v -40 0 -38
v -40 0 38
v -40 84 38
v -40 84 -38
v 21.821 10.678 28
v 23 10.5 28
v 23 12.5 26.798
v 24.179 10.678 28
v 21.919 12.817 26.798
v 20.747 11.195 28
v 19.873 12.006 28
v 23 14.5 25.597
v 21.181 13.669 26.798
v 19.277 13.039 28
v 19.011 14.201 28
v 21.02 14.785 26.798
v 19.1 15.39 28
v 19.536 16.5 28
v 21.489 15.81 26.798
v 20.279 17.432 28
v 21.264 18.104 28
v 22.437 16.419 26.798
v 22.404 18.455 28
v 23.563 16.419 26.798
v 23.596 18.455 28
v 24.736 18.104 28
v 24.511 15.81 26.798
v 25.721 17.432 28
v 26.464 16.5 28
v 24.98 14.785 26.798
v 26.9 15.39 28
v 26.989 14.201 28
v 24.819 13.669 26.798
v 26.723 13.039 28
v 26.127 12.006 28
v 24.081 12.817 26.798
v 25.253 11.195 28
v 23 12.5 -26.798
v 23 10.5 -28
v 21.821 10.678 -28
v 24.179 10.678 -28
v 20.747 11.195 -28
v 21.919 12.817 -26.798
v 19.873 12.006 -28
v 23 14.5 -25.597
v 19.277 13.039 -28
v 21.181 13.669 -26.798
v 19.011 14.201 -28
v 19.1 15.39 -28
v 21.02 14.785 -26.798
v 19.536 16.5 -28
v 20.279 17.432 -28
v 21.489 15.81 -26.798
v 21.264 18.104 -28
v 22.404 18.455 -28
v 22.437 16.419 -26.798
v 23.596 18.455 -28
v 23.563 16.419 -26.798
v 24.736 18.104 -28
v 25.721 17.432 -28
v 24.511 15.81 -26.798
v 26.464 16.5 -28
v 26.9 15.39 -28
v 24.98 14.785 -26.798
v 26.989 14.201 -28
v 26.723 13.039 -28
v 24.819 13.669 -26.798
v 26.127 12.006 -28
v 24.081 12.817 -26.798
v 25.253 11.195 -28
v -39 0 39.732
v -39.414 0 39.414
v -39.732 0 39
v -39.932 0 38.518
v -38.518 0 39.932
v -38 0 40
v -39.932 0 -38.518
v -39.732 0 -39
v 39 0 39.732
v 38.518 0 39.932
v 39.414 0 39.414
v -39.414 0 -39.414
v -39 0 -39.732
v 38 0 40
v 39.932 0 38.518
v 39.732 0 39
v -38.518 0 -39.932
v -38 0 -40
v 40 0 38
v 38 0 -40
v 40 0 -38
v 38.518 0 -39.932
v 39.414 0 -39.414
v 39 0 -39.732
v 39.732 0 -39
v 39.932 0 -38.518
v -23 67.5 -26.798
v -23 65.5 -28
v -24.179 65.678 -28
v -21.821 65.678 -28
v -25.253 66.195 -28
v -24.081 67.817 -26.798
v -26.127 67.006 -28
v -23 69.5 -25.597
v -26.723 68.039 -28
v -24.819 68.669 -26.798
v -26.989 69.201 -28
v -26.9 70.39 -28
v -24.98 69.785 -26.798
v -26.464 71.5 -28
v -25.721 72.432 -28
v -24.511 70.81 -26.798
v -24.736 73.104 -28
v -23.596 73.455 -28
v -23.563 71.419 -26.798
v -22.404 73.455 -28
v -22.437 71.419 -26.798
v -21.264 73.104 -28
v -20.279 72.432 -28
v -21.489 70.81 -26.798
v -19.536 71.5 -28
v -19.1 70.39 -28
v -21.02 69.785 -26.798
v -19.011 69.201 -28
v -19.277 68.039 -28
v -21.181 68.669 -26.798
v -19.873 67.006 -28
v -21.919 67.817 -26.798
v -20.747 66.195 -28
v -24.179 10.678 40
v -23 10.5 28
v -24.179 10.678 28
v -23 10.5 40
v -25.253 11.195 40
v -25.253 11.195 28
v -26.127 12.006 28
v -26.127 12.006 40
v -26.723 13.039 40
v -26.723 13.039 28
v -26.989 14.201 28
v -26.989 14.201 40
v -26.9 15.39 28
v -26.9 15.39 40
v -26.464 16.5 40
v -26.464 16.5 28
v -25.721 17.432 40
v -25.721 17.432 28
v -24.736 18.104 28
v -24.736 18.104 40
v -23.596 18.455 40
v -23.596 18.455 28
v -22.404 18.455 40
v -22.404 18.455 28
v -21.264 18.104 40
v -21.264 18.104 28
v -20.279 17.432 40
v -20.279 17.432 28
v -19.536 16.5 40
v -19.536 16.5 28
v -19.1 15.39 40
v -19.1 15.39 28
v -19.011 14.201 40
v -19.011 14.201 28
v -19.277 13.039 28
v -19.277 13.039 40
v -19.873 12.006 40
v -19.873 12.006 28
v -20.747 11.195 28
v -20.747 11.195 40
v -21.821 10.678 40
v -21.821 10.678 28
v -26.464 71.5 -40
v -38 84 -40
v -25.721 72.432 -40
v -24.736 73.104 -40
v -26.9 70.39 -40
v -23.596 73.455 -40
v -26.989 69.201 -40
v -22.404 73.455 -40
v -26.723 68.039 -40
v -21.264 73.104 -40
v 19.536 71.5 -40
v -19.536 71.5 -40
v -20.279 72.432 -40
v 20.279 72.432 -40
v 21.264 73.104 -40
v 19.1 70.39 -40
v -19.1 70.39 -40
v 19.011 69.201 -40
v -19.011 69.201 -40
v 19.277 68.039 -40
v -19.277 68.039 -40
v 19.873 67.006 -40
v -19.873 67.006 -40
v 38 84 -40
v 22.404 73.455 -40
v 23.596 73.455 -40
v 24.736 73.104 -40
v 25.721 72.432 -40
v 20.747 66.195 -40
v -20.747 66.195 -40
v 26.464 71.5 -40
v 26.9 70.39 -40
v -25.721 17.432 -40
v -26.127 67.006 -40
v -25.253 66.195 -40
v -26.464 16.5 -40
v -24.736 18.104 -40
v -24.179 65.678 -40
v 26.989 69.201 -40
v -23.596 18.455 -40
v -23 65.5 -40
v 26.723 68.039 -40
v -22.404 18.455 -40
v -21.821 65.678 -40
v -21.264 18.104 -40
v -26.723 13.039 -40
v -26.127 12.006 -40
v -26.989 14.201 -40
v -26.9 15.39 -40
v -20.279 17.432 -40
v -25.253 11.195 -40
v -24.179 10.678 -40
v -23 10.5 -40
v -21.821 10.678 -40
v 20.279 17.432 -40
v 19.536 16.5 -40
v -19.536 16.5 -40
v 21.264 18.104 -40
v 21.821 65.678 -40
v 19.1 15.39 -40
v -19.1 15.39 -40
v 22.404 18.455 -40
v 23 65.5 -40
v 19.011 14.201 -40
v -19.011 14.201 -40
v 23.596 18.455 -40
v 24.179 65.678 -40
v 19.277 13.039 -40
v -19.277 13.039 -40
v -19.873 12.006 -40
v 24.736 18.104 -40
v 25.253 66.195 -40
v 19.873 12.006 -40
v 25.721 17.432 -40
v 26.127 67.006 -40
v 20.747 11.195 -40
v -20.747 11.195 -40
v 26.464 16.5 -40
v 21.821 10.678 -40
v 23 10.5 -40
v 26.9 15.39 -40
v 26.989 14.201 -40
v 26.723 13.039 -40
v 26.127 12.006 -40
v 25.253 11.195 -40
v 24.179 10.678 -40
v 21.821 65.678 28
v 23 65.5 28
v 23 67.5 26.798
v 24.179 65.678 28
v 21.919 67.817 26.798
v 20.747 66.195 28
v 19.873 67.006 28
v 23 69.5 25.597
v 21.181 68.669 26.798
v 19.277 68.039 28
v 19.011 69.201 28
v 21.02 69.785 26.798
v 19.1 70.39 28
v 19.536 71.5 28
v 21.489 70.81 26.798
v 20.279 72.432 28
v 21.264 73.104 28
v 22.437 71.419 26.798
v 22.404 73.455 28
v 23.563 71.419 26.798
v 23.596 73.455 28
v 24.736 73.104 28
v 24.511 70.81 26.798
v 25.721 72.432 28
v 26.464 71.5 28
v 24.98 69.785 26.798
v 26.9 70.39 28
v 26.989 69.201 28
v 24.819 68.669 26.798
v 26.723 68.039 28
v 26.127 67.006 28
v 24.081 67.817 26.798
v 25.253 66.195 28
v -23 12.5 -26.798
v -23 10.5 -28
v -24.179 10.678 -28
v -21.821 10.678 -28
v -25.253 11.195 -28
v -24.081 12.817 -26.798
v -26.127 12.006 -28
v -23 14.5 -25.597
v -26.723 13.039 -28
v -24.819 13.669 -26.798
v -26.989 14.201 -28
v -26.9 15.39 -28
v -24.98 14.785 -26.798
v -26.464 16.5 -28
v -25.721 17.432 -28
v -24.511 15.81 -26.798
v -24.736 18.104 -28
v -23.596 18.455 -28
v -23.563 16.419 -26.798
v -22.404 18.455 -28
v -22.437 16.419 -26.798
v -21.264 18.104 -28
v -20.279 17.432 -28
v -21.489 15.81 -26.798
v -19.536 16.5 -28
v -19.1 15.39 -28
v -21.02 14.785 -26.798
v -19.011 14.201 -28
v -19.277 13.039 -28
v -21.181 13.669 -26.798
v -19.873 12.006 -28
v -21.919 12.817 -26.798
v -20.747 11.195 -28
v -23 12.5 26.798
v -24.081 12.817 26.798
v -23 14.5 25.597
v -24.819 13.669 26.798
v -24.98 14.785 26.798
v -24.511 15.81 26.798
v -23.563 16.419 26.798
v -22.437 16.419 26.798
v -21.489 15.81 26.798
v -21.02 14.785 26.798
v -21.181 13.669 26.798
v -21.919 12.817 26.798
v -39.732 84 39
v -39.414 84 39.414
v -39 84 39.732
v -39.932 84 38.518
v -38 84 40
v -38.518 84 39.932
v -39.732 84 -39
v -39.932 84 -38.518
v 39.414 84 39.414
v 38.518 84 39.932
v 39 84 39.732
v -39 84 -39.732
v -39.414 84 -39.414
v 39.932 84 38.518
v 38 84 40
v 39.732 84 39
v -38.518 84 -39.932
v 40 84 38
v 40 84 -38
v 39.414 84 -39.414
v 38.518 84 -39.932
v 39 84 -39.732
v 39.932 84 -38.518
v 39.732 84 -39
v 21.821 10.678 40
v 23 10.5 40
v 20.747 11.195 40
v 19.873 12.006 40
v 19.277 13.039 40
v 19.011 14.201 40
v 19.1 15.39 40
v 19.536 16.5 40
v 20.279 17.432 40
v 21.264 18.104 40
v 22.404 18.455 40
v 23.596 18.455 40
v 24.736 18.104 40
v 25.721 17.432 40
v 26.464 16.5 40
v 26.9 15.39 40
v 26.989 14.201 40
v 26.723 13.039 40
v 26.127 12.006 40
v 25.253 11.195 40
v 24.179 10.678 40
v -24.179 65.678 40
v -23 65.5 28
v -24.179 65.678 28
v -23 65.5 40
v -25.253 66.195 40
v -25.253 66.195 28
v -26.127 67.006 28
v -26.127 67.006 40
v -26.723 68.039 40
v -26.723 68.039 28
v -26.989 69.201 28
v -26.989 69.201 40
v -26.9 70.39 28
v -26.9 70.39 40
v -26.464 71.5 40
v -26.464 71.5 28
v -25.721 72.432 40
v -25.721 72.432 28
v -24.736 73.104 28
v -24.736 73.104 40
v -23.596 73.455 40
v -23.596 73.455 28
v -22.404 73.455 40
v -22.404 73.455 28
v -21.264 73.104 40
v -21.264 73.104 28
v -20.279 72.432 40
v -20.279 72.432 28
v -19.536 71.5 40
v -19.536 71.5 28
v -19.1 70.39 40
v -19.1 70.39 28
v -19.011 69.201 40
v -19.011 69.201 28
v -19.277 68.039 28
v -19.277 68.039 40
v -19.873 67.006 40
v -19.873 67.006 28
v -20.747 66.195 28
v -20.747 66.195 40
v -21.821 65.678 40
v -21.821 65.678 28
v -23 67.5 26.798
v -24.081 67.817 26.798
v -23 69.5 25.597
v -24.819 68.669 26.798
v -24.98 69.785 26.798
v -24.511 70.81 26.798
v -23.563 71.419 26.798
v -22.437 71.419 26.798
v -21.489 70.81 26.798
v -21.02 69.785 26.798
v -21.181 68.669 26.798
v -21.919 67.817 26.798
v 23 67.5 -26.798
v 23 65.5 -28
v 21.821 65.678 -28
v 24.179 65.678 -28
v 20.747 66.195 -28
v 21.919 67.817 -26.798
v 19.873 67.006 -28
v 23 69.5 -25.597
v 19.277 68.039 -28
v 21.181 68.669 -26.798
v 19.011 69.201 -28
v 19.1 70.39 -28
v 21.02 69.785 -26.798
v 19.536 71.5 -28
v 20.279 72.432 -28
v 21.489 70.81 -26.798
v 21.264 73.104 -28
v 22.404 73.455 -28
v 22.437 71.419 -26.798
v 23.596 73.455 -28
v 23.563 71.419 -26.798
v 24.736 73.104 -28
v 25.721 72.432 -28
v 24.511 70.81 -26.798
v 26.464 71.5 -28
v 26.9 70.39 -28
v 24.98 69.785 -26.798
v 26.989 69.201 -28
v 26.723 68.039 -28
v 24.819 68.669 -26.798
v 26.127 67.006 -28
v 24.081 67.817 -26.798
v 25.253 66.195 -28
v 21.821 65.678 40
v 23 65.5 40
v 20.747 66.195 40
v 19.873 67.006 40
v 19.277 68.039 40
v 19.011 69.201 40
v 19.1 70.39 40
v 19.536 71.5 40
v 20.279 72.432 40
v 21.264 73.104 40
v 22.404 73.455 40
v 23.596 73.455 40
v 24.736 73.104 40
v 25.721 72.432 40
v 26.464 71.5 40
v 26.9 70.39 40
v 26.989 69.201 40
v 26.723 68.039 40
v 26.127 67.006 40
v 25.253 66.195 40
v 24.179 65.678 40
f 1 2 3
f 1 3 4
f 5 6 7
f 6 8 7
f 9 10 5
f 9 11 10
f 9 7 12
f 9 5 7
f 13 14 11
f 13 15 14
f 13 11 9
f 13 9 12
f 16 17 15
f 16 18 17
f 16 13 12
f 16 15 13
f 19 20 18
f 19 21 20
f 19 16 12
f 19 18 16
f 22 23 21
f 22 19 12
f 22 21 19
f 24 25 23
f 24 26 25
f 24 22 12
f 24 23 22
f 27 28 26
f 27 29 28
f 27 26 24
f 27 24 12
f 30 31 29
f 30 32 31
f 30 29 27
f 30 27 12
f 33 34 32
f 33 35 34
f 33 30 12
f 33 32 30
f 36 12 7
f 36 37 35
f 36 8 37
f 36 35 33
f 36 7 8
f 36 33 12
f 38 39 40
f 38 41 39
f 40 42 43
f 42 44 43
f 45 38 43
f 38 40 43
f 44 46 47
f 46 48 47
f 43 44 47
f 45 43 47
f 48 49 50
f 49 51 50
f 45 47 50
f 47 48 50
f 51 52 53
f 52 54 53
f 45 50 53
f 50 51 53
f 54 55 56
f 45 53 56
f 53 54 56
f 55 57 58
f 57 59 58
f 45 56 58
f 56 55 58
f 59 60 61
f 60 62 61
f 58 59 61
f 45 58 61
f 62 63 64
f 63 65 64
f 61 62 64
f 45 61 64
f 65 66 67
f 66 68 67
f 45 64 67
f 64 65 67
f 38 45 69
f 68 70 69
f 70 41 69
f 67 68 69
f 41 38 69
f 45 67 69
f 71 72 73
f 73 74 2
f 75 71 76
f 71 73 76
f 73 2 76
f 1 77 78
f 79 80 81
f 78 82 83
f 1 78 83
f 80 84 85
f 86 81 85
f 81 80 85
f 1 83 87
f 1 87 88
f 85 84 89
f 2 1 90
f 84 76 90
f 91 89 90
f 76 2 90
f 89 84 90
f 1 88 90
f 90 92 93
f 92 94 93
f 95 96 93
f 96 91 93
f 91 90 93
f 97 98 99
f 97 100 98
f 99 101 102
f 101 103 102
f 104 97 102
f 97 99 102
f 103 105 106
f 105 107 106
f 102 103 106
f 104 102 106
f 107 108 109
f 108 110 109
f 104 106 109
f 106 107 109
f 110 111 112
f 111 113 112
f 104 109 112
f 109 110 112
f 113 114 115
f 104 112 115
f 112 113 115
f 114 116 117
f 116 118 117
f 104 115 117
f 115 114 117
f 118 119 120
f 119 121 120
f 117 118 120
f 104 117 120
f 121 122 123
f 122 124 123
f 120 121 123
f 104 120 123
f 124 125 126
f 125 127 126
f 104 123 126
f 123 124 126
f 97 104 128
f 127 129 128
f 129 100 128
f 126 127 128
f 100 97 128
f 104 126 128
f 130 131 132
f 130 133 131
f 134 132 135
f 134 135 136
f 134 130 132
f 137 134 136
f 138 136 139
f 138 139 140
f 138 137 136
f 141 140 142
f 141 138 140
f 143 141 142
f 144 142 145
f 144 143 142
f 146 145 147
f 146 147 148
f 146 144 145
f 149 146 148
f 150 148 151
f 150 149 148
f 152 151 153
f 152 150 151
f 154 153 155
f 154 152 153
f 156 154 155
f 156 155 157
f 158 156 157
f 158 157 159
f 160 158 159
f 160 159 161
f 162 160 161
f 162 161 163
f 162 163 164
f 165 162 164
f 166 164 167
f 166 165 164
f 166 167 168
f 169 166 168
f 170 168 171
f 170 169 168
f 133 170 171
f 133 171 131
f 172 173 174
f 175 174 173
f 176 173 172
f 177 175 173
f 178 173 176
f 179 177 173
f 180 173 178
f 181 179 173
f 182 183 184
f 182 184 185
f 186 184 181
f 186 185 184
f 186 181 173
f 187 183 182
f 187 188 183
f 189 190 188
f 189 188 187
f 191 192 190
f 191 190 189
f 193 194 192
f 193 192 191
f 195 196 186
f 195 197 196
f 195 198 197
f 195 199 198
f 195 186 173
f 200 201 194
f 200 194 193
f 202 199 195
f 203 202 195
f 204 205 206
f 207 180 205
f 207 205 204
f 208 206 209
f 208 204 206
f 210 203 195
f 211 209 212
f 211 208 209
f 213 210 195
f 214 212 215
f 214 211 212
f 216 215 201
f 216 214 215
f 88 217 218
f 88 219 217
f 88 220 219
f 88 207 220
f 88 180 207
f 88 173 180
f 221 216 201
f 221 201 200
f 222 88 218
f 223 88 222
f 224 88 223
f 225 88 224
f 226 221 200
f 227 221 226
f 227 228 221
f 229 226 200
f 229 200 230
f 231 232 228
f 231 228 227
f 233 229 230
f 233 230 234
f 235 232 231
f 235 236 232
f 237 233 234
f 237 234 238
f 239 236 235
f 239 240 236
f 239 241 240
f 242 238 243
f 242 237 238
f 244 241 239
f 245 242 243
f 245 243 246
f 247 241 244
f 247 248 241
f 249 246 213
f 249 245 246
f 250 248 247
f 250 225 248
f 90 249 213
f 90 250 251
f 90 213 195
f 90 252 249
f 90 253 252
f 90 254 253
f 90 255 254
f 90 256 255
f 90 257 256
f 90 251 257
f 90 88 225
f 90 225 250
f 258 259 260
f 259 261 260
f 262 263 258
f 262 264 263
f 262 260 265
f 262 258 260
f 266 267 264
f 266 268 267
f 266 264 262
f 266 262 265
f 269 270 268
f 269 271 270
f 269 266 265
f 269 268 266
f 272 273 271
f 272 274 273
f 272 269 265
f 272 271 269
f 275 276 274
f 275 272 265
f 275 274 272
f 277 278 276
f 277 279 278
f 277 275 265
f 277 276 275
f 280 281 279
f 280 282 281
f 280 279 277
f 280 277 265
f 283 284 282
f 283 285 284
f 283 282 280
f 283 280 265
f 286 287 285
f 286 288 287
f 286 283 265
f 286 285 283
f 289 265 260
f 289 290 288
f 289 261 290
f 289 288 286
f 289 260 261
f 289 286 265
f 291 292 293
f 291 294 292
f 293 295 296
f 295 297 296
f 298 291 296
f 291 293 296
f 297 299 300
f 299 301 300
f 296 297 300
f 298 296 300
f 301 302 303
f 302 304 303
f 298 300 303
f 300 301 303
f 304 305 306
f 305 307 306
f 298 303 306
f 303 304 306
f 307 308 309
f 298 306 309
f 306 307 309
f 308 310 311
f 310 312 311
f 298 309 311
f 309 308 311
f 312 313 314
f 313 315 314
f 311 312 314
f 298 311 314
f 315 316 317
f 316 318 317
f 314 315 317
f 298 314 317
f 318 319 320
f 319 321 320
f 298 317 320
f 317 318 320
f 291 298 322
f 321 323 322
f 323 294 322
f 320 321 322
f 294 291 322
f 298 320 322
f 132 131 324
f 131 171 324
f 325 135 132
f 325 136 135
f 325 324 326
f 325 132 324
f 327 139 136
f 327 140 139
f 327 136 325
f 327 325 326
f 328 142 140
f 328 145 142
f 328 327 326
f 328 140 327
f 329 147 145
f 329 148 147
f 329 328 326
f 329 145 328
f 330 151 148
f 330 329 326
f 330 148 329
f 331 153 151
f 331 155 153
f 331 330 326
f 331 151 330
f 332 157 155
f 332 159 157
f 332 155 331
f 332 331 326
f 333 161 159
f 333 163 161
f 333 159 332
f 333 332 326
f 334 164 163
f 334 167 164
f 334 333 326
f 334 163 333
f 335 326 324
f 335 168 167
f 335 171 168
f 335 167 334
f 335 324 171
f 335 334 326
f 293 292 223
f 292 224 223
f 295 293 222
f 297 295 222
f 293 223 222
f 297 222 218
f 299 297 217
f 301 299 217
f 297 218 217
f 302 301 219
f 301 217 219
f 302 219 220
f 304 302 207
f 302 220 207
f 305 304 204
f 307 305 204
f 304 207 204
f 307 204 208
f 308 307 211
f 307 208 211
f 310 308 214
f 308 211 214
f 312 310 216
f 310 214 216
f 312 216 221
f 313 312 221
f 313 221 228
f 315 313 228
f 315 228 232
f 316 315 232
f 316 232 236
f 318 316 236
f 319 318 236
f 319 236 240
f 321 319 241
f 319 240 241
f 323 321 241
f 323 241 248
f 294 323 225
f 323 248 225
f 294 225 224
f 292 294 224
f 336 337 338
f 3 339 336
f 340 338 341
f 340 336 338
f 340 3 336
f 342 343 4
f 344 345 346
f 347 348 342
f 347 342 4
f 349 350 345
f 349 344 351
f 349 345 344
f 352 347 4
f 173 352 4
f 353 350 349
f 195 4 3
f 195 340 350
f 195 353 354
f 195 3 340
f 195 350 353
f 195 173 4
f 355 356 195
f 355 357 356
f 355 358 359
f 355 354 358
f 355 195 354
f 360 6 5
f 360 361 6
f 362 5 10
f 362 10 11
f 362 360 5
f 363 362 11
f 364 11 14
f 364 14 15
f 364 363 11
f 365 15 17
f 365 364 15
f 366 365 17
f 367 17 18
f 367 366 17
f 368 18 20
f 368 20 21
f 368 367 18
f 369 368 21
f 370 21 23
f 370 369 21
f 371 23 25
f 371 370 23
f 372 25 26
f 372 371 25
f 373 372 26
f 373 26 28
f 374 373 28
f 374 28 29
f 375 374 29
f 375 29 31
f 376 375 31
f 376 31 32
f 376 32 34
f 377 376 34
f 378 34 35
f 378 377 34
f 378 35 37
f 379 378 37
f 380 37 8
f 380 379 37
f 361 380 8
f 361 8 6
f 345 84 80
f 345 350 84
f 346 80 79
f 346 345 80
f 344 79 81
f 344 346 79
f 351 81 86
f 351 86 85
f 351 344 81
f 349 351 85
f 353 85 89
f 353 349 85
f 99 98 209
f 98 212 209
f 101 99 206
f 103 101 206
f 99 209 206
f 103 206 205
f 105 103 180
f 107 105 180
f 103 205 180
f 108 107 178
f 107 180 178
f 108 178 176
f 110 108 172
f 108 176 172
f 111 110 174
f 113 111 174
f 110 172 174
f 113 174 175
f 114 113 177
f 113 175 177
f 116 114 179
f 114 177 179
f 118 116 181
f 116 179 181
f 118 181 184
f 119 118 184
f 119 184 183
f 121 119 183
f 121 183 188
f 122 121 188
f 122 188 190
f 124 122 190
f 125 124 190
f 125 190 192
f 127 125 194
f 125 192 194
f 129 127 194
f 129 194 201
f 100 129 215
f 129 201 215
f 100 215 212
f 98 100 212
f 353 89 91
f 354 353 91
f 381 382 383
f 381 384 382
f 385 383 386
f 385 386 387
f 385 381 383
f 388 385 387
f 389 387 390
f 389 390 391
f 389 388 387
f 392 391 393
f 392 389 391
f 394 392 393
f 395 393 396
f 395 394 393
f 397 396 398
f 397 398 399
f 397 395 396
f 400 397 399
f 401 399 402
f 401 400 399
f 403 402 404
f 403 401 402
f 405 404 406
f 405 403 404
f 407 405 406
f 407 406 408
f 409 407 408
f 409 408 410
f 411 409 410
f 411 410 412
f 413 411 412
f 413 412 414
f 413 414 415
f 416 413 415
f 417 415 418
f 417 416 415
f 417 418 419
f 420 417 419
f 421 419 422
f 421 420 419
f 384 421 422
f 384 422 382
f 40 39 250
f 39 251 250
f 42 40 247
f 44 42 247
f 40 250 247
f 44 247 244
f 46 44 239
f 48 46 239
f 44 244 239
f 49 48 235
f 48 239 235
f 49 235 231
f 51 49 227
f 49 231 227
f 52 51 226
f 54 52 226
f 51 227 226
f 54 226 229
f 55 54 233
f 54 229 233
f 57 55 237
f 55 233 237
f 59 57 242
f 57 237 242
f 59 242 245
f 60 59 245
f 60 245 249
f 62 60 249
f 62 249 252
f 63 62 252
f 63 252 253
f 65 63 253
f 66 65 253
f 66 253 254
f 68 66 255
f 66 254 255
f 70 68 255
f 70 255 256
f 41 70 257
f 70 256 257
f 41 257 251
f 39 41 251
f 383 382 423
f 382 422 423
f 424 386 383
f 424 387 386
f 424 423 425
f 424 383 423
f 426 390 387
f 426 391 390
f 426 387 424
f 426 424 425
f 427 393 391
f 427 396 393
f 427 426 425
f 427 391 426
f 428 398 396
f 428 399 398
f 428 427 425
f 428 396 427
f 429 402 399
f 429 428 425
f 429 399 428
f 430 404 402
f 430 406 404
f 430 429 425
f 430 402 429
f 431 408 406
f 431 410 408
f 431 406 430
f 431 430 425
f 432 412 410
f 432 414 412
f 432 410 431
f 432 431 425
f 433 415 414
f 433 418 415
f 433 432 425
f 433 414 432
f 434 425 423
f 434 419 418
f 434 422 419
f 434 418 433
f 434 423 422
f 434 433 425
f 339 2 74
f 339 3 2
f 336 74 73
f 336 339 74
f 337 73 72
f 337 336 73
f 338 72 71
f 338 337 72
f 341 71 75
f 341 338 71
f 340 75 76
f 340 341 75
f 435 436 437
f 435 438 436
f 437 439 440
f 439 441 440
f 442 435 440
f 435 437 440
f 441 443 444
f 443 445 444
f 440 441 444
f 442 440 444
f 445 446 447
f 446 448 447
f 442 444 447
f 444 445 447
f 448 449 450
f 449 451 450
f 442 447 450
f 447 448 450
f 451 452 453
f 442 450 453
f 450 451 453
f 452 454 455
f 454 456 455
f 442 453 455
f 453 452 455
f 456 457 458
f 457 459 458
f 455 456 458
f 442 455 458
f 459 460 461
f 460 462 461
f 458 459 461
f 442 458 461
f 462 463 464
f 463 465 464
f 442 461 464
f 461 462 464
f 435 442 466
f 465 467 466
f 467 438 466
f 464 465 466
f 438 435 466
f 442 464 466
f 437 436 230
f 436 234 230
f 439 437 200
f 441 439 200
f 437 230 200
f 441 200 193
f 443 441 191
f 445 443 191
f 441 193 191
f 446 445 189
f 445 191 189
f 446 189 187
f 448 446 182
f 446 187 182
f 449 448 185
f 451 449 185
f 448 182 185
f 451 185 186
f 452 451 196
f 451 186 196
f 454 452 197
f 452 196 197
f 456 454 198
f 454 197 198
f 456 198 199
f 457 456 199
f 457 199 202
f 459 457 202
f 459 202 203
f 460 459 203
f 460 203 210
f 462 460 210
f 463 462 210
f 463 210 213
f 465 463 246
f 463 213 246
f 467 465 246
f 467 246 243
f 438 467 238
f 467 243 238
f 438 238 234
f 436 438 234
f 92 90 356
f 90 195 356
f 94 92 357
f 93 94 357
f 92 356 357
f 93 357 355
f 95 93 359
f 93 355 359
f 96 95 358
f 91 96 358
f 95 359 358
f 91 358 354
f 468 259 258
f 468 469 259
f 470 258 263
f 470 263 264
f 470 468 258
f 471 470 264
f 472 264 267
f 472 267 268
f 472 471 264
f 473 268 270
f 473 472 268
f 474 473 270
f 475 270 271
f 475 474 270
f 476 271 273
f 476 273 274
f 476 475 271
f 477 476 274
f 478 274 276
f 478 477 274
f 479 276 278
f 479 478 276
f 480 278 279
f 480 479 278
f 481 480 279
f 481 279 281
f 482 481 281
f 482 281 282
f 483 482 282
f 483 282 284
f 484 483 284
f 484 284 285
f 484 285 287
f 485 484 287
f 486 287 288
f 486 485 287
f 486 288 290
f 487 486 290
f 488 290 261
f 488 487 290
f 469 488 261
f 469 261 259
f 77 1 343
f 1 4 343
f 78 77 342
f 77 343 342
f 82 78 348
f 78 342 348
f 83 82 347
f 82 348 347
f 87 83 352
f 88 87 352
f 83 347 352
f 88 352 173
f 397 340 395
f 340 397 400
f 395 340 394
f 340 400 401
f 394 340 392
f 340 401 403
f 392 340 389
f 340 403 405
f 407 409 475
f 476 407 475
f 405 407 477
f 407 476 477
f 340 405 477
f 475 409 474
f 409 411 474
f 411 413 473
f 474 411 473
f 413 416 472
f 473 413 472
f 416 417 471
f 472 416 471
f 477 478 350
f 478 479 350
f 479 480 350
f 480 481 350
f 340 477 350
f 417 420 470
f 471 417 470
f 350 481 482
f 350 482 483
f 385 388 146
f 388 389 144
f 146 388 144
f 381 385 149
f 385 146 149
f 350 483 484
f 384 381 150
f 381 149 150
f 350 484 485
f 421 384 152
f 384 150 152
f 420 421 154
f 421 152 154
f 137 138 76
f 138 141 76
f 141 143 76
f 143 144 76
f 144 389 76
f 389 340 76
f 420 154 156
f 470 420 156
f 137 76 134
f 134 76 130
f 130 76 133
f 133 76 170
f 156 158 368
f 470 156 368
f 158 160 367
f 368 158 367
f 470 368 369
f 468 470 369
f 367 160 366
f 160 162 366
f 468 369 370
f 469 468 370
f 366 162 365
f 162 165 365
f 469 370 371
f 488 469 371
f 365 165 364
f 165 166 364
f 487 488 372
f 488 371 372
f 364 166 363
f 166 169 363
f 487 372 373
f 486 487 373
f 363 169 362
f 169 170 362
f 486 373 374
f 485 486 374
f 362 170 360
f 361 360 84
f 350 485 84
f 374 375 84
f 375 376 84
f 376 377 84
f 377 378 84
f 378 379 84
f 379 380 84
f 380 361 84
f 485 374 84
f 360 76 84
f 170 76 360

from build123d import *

# Parameters (mm, degrees)
SZKIC1_W                            = 80
SZKIC1_H                            = 80
DODANIE_WYCI_GNI_CIE1_DEPTH         = 84
OTWORY_USTALAJ_CE_8_0MM1_AT_2_COUNT = 2
OTWORY_USTALAJ_CE_8_0MM1_AT_2_PITCH = 46
OTWORY_USTALAJ_CE_8_0MM1_AT_3_COUNT = 2
OTWORY_USTALAJ_CE_8_0MM1_AT_3_PITCH = 71.700767081
OTWORY_USTALAJ_CE_8_0MM1_AT_4_COUNT = 2
OTWORY_USTALAJ_CE_8_0MM1_AT_4_PITCH = 55
ZAOKR_GLENIE2_R                     = 2


with BuildPart() as part:
    # Szkic1 → Dodanie-wyciągnięcie1 (new body)
    with BuildSketch(Plane(origin=(0, 0, 0), x_dir=(1, 0, 0), z_dir=(0, 1, 0))):
        Rectangle(SZKIC1_W, SZKIC1_H)
    extrude(amount=DODANIE_WYCI_GNI_CIE1_DEPTH)

    # Szkic4 → Otwory ustalające Ø8.0mm1 (revolve, cut)
    with BuildSketch(Plane(origin=(-23, 69.5, 40), x_dir=(0, -1, 0), z_dir=(1, 0, 0))):
        Polygon((0, 0), (0, 14.403442476), (4, 12), (4, 0), align=None)
    otwory_ustalaj_ce_8_0mm1 = revolve(axis=Axis((-23, 69.5, 46.35), (0, 0, -1)), mode=Mode.SUBTRACT)

    # Otwory ustalające Ø8.0mm1 at 2: Otwory ustalające Ø8.0mm1 ×2
    with Locations(*[(i * OTWORY_USTALAJ_CE_8_0MM1_AT_2_PITCH, 0, 0) for i in range(1, OTWORY_USTALAJ_CE_8_0MM1_AT_2_COUNT)]):
        add(otwory_ustalaj_ce_8_0mm1, mode=Mode.SUBTRACT)

    # Otwory ustalające Ø8.0mm1 at 3: Otwory ustalające Ø8.0mm1 ×2
    with Locations(*[Vector(0.6415552004911063, -0.7670768701524096, 0) * (i * OTWORY_USTALAJ_CE_8_0MM1_AT_3_PITCH) for i in range(1, OTWORY_USTALAJ_CE_8_0MM1_AT_3_COUNT)]):
        add(otwory_ustalaj_ce_8_0mm1, mode=Mode.SUBTRACT)

    # Otwory ustalające Ø8.0mm1 at 4: Otwory ustalające Ø8.0mm1 ×2
    with Locations(*[(0, -i * OTWORY_USTALAJ_CE_8_0MM1_AT_4_PITCH, 0) for i in range(1, OTWORY_USTALAJ_CE_8_0MM1_AT_4_COUNT)]):
        add(otwory_ustalaj_ce_8_0mm1, mode=Mode.SUBTRACT)

    # Lustro1: Otwory ustalające Ø8.0mm1 across plane
    add(otwory_ustalaj_ce_8_0mm1.mirror(Plane.XY), mode=Mode.SUBTRACT)

    # Lustro1 copy 1 sketch → Lustro1 copy 1 (revolve, cut)
    with BuildSketch(Plane(origin=(23, 69.5, -40), x_dir=(0, -1, 0), z_dir=(1, 0, 0))):
        Polygon((0, 0), (0, -14.403442476), (4, -12), (4, 0), align=None)
    revolve(axis=Axis((23, 69.5, -46.35), (0, 0, -1)), mode=Mode.SUBTRACT)

    # Lustro1 copy 2 sketch → Lustro1 copy 2 (revolve, cut)
    with BuildSketch(Plane(origin=(23, 14.5, -40), x_dir=(0, -1, 0), z_dir=(1, 0, 0))):
        Polygon((0, 0), (0, -14.403442476), (4, -12), (4, 0), align=None)
    revolve(axis=Axis((23, 14.5, -46.35), (0, 0, -1)), mode=Mode.SUBTRACT)

    # Lustro1 copy 3 sketch → Lustro1 copy 3 (revolve, cut)
    with BuildSketch(Plane(origin=(-23, 14.5, -40), x_dir=(0, -1, 0), z_dir=(1, 0, 0))):
        Polygon((0, 0), (0, -14.403442476), (4, -12), (4, 0), align=None)
    revolve(axis=Axis((-23, 14.5, -46.35), (0, 0, -1)), mode=Mode.SUBTRACT)

    # Zaokrąglenie2
    zaokr_glenie2_edges = [part.edges().sort_by_distance(p)[0] for p in [
        (40, 42, 40),
        (-40, 42, 40),
        (-40, 42, -40),
        (40, 42, -40),
    ]]
    fillet(zaokr_glenie2_edges, radius=ZAOKR_GLENIE2_R)


solid = part.part
